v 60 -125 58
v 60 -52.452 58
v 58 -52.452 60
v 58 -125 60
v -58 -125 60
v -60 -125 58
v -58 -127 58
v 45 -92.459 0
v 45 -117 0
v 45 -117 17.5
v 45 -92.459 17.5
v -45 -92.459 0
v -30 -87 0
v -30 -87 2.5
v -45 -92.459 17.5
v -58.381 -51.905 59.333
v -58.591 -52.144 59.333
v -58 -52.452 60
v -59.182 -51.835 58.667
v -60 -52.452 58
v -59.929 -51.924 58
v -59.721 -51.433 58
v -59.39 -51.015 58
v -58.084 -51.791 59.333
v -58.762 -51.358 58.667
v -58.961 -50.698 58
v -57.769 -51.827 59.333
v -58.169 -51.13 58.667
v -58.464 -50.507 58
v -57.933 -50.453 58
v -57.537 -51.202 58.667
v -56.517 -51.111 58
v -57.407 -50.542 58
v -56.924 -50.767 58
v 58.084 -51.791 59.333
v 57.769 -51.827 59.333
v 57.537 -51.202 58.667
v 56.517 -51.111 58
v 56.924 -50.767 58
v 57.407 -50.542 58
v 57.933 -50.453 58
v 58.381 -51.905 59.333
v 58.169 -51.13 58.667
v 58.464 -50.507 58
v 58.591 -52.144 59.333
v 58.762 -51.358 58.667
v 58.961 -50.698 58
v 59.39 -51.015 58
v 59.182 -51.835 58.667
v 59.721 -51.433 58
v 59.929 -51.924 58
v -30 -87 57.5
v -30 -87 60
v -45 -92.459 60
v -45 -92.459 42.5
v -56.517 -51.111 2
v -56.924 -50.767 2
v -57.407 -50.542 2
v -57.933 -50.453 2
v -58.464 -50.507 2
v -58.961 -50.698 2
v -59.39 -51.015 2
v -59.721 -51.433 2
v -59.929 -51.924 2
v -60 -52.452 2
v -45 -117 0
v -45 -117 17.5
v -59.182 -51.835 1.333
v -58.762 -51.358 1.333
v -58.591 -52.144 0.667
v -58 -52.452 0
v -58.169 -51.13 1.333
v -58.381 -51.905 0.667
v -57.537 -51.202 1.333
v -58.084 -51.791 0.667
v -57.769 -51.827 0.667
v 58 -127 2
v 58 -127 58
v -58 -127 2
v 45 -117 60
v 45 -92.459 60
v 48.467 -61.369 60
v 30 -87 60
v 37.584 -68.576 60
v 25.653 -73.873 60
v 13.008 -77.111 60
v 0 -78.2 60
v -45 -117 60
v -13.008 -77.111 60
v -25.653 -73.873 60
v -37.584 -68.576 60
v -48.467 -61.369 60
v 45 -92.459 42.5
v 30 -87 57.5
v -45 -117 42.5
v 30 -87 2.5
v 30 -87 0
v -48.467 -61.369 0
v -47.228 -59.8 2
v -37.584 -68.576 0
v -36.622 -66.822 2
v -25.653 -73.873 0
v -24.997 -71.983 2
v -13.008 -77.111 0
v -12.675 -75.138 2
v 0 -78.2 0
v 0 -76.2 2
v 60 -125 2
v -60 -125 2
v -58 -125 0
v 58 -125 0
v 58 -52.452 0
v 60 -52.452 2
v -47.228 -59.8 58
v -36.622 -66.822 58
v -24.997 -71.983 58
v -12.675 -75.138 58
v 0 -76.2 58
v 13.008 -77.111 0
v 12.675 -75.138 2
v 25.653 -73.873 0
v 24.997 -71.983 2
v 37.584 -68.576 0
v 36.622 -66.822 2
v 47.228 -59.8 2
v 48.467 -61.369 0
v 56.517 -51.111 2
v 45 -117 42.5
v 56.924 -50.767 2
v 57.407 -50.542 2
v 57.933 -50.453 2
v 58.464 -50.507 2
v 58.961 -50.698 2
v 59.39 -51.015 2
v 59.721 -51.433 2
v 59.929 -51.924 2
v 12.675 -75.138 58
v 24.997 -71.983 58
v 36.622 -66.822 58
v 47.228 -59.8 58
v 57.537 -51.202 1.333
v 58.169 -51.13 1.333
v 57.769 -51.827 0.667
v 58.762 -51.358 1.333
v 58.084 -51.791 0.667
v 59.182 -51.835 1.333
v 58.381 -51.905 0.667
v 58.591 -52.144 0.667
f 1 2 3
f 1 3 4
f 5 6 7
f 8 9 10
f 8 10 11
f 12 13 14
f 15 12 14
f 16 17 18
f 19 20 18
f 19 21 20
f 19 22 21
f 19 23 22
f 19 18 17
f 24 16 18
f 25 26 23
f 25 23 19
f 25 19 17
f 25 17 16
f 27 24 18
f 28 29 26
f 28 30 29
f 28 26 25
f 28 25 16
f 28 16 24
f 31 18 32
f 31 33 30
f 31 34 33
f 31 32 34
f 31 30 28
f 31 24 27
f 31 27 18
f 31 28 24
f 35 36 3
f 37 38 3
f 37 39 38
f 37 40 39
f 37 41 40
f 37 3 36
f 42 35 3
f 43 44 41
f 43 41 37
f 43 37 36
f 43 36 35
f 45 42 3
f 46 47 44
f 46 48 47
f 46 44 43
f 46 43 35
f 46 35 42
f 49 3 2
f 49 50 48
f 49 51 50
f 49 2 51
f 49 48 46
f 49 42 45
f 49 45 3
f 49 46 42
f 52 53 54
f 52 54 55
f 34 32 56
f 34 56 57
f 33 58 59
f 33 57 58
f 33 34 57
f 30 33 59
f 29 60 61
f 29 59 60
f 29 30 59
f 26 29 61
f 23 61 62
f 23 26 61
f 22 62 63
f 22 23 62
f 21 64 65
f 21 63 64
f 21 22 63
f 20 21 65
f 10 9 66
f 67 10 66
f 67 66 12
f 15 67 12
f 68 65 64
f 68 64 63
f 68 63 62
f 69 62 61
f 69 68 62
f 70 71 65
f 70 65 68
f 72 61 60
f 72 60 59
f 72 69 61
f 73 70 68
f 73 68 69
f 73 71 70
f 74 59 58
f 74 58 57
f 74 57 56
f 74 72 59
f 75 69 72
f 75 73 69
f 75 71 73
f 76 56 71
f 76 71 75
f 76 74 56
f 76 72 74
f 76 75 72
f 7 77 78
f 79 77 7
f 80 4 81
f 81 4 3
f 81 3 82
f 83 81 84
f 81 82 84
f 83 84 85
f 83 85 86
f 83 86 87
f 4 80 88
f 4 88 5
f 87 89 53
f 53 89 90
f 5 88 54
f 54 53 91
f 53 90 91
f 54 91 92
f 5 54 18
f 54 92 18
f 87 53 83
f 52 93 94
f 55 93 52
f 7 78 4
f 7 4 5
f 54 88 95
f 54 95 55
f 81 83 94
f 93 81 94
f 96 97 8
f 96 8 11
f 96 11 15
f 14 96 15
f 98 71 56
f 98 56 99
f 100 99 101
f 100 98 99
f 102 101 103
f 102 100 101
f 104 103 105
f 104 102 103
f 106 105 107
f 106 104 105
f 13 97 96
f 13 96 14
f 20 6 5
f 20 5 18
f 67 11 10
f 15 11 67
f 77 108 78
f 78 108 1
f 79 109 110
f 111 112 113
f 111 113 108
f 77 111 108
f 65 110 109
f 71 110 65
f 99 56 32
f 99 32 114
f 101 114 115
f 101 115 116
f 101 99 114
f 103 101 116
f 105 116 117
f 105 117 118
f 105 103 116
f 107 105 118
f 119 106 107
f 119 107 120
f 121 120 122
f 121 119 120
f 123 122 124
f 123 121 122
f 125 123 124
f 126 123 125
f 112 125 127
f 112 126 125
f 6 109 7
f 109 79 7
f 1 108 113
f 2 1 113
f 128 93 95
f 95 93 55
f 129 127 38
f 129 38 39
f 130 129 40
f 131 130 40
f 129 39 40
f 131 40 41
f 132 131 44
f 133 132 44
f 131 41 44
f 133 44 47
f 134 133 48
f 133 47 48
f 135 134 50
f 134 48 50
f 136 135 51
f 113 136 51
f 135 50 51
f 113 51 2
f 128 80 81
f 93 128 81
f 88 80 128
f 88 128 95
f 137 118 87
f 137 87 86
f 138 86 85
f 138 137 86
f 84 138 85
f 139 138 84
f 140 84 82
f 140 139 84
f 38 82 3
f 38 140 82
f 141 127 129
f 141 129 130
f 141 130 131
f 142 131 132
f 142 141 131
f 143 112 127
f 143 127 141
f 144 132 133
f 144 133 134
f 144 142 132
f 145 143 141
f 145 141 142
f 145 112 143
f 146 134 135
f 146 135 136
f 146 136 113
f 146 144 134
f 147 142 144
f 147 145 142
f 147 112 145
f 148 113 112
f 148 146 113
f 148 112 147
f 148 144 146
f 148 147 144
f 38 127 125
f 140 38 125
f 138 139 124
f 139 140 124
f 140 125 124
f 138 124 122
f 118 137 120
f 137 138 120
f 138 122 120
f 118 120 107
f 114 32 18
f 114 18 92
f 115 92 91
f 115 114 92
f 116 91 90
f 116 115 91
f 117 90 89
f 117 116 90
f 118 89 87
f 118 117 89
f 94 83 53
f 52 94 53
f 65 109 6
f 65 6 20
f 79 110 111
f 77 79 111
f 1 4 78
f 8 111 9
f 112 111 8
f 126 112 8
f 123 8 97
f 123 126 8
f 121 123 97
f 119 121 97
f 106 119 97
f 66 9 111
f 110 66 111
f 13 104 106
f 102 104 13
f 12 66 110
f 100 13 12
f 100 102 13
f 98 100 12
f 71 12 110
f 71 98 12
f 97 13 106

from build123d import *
from OCP.BRepFilletAPI import BRepFilletAPI_MakeChamfer

# Parameters (mm, degrees)
BOSS_EXTRUDE1_DEPTH        = 60
FILLET1_R                  = 2
CHAMFER1_SIZE              = 2
SKETCH2_W                  = 90
SKETCH2_H                  = 30
CUT_EXTRUDE1_DEPTH         = 17.5
CHAMFER2_SIZE              = 15
CHAMFER2_SIZE_2            = 5.459553514
CHAMFER2_OF_MIRROR2_SIZE   = 15
CHAMFER2_OF_MIRROR2_SIZE_2 = 5.459553514


with BuildPart() as part:
    # Sketch1 → Boss-Extrude1 (new body)
    with BuildSketch(Plane.XY):
        with BuildLine():
            Line((0, -76.2), (0, -127))
            Line((0, -127), (60, -127))
            Line((60, -127), (60, -46.972758063))
            ThreePointArc((60, -46.972758063), (33.37001525, -68.504613583), (0, -76.2))
        make_face()
    boss_extrude1 = extrude(amount=BOSS_EXTRUDE1_DEPTH)

    # Mirror1: Boss-Extrude1 across plane
    add(boss_extrude1.mirror(Plane(origin=(0, -76.2, 60), x_dir=(0, 0, 1), z_dir=(1, 0, 0))))

    # Fillet1
    fillet1_edges = [part.edges().sort_by_distance(p)[0] for p in [
        (-60, -46.972758063, 30),
        (60, -46.972758063, 30),
    ]]
    fillet(fillet1_edges, radius=FILLET1_R)

    # Chamfer1
    chamfer1_edges = [part.edges().sort_by_distance(p)[0] for p in [
        (-60, -127, 30),
        (-60, -89.726132006, 60),
        (-60, -89.726132006, 0),
        (0, -76.2, 0),
        (0, -76.2, 60),
        (-58.718765637, -50.585883569, 0),
        (58.718765637, -50.585883569, 0),
        (-58.718765637, -50.585883569, 60),
        (58.718765637, -50.585883569, 60),
        (0, -127, 60),
        (60, -89.726132006, 0),
        (0, -127, 0),
        (60, -127, 30),
        (60, -89.726132006, 60),
    ]]
    chamfer(chamfer1_edges, length=CHAMFER1_SIZE)

    # Sketch2 → Cut-Extrude1 (cut)
    with BuildSketch(Plane(origin=(0, 0, 0), x_dir=(-1, 0, 0), z_dir=(0, 0, -1))):
        with Locations((0, -102)):
            Rectangle(SKETCH2_W, SKETCH2_H)
    cut_extrude1 = extrude(amount=-CUT_EXTRUDE1_DEPTH, mode=Mode.SUBTRACT)

    # Chamfer2
    chamfer2_edges_1 = [part.edges().sort_by_distance(p)[0] for p in [
        (-45, -87, 8.75),
    ]]
    chamfer2_side_1 = [part.faces().sort_by_distance(p)[0] for p in [
        (-44.89080893, -87, 8.75),
    ]]
    chamfer2_edges_2 = [part.edges().sort_by_distance(p)[0] for p in [
        (0, -87, 17.5),
    ]]
    chamfer2_side_2 = [part.faces().sort_by_distance(p)[0] for p in [
        (0, -87, 17.39080893),
    ]]
    chamfer2_edges_3 = [part.edges().sort_by_distance(p)[0] for p in [
        (45, -87, 8.75),
    ]]
    chamfer2_side_3 = [part.faces().sort_by_distance(p)[0] for p in [
        (45, -87.10919107, 8.75),
    ]]
    chamfer2 = BRepFilletAPI_MakeChamfer(part.part.solid().wrapped)
    for e in chamfer2_edges_1:
        chamfer2.Add(CHAMFER2_SIZE - 0.0001, CHAMFER2_SIZE_2 - 0.0001, e.wrapped, chamfer2_side_1[0].wrapped)
    for e in chamfer2_edges_2:
        chamfer2.Add(CHAMFER2_SIZE - 0.0001, CHAMFER2_SIZE_2 - 0.0001, e.wrapped, chamfer2_side_2[0].wrapped)
    for e in chamfer2_edges_3:
        chamfer2.Add(CHAMFER2_SIZE_2 - 0.0001, CHAMFER2_SIZE - 0.0001, e.wrapped, chamfer2_side_3[0].wrapped)
    add(Compound.cast(chamfer2.Shape()), mode=Mode.REPLACE)  # a hair under: the kernel refuses the full size

    # Mirror2: Cut-Extrude1 across plane
    add(cut_extrude1.mirror(Plane(origin=(0, 0, 30), x_dir=(1, 0, 0), z_dir=(0, 0, -1))), mode=Mode.SUBTRACT)

    # Chamfer2 of Mirror2
    chamfer2_of_mirror2_edges_1 = [part.edges().sort_by_distance(p)[0] for p in [
        (-45, -87, 51.25),
    ]]
    chamfer2_of_mirror2_side_1 = [part.faces().sort_by_distance(p)[0] for p in [
        (-44.89080893, -87, 51.25),
    ]]
    chamfer2_of_mirror2_edges_2 = [part.edges().sort_by_distance(p)[0] for p in [
        (0, -87, 42.5),
    ]]
    chamfer2_of_mirror2_side_2 = [part.faces().sort_by_distance(p)[0] for p in [
        (0, -87, 42.60919107),
    ]]
    chamfer2_of_mirror2_edges_3 = [part.edges().sort_by_distance(p)[0] for p in [
        (45, -87, 51.25),
    ]]
    chamfer2_of_mirror2_side_3 = [part.faces().sort_by_distance(p)[0] for p in [
        (45, -87.10919107, 51.25),
    ]]
    chamfer2_of_mirror2 = BRepFilletAPI_MakeChamfer(part.part.solid().wrapped)
    for e in chamfer2_of_mirror2_edges_1:
        chamfer2_of_mirror2.Add(CHAMFER2_OF_MIRROR2_SIZE - 0.0001, CHAMFER2_OF_MIRROR2_SIZE_2 - 0.0001, e.wrapped, chamfer2_of_mirror2_side_1[0].wrapped)
    for e in chamfer2_of_mirror2_edges_2:
        chamfer2_of_mirror2.Add(CHAMFER2_OF_MIRROR2_SIZE - 0.0001, CHAMFER2_OF_MIRROR2_SIZE_2 - 0.0001, e.wrapped, chamfer2_of_mirror2_side_2[0].wrapped)
    for e in chamfer2_of_mirror2_edges_3:
        chamfer2_of_mirror2.Add(CHAMFER2_OF_MIRROR2_SIZE_2 - 0.0001, CHAMFER2_OF_MIRROR2_SIZE - 0.0001, e.wrapped, chamfer2_of_mirror2_side_3[0].wrapped)
    add(Compound.cast(chamfer2_of_mirror2.Shape()), mode=Mode.REPLACE)  # a hair under: the kernel refuses the full size


solid = part.part
